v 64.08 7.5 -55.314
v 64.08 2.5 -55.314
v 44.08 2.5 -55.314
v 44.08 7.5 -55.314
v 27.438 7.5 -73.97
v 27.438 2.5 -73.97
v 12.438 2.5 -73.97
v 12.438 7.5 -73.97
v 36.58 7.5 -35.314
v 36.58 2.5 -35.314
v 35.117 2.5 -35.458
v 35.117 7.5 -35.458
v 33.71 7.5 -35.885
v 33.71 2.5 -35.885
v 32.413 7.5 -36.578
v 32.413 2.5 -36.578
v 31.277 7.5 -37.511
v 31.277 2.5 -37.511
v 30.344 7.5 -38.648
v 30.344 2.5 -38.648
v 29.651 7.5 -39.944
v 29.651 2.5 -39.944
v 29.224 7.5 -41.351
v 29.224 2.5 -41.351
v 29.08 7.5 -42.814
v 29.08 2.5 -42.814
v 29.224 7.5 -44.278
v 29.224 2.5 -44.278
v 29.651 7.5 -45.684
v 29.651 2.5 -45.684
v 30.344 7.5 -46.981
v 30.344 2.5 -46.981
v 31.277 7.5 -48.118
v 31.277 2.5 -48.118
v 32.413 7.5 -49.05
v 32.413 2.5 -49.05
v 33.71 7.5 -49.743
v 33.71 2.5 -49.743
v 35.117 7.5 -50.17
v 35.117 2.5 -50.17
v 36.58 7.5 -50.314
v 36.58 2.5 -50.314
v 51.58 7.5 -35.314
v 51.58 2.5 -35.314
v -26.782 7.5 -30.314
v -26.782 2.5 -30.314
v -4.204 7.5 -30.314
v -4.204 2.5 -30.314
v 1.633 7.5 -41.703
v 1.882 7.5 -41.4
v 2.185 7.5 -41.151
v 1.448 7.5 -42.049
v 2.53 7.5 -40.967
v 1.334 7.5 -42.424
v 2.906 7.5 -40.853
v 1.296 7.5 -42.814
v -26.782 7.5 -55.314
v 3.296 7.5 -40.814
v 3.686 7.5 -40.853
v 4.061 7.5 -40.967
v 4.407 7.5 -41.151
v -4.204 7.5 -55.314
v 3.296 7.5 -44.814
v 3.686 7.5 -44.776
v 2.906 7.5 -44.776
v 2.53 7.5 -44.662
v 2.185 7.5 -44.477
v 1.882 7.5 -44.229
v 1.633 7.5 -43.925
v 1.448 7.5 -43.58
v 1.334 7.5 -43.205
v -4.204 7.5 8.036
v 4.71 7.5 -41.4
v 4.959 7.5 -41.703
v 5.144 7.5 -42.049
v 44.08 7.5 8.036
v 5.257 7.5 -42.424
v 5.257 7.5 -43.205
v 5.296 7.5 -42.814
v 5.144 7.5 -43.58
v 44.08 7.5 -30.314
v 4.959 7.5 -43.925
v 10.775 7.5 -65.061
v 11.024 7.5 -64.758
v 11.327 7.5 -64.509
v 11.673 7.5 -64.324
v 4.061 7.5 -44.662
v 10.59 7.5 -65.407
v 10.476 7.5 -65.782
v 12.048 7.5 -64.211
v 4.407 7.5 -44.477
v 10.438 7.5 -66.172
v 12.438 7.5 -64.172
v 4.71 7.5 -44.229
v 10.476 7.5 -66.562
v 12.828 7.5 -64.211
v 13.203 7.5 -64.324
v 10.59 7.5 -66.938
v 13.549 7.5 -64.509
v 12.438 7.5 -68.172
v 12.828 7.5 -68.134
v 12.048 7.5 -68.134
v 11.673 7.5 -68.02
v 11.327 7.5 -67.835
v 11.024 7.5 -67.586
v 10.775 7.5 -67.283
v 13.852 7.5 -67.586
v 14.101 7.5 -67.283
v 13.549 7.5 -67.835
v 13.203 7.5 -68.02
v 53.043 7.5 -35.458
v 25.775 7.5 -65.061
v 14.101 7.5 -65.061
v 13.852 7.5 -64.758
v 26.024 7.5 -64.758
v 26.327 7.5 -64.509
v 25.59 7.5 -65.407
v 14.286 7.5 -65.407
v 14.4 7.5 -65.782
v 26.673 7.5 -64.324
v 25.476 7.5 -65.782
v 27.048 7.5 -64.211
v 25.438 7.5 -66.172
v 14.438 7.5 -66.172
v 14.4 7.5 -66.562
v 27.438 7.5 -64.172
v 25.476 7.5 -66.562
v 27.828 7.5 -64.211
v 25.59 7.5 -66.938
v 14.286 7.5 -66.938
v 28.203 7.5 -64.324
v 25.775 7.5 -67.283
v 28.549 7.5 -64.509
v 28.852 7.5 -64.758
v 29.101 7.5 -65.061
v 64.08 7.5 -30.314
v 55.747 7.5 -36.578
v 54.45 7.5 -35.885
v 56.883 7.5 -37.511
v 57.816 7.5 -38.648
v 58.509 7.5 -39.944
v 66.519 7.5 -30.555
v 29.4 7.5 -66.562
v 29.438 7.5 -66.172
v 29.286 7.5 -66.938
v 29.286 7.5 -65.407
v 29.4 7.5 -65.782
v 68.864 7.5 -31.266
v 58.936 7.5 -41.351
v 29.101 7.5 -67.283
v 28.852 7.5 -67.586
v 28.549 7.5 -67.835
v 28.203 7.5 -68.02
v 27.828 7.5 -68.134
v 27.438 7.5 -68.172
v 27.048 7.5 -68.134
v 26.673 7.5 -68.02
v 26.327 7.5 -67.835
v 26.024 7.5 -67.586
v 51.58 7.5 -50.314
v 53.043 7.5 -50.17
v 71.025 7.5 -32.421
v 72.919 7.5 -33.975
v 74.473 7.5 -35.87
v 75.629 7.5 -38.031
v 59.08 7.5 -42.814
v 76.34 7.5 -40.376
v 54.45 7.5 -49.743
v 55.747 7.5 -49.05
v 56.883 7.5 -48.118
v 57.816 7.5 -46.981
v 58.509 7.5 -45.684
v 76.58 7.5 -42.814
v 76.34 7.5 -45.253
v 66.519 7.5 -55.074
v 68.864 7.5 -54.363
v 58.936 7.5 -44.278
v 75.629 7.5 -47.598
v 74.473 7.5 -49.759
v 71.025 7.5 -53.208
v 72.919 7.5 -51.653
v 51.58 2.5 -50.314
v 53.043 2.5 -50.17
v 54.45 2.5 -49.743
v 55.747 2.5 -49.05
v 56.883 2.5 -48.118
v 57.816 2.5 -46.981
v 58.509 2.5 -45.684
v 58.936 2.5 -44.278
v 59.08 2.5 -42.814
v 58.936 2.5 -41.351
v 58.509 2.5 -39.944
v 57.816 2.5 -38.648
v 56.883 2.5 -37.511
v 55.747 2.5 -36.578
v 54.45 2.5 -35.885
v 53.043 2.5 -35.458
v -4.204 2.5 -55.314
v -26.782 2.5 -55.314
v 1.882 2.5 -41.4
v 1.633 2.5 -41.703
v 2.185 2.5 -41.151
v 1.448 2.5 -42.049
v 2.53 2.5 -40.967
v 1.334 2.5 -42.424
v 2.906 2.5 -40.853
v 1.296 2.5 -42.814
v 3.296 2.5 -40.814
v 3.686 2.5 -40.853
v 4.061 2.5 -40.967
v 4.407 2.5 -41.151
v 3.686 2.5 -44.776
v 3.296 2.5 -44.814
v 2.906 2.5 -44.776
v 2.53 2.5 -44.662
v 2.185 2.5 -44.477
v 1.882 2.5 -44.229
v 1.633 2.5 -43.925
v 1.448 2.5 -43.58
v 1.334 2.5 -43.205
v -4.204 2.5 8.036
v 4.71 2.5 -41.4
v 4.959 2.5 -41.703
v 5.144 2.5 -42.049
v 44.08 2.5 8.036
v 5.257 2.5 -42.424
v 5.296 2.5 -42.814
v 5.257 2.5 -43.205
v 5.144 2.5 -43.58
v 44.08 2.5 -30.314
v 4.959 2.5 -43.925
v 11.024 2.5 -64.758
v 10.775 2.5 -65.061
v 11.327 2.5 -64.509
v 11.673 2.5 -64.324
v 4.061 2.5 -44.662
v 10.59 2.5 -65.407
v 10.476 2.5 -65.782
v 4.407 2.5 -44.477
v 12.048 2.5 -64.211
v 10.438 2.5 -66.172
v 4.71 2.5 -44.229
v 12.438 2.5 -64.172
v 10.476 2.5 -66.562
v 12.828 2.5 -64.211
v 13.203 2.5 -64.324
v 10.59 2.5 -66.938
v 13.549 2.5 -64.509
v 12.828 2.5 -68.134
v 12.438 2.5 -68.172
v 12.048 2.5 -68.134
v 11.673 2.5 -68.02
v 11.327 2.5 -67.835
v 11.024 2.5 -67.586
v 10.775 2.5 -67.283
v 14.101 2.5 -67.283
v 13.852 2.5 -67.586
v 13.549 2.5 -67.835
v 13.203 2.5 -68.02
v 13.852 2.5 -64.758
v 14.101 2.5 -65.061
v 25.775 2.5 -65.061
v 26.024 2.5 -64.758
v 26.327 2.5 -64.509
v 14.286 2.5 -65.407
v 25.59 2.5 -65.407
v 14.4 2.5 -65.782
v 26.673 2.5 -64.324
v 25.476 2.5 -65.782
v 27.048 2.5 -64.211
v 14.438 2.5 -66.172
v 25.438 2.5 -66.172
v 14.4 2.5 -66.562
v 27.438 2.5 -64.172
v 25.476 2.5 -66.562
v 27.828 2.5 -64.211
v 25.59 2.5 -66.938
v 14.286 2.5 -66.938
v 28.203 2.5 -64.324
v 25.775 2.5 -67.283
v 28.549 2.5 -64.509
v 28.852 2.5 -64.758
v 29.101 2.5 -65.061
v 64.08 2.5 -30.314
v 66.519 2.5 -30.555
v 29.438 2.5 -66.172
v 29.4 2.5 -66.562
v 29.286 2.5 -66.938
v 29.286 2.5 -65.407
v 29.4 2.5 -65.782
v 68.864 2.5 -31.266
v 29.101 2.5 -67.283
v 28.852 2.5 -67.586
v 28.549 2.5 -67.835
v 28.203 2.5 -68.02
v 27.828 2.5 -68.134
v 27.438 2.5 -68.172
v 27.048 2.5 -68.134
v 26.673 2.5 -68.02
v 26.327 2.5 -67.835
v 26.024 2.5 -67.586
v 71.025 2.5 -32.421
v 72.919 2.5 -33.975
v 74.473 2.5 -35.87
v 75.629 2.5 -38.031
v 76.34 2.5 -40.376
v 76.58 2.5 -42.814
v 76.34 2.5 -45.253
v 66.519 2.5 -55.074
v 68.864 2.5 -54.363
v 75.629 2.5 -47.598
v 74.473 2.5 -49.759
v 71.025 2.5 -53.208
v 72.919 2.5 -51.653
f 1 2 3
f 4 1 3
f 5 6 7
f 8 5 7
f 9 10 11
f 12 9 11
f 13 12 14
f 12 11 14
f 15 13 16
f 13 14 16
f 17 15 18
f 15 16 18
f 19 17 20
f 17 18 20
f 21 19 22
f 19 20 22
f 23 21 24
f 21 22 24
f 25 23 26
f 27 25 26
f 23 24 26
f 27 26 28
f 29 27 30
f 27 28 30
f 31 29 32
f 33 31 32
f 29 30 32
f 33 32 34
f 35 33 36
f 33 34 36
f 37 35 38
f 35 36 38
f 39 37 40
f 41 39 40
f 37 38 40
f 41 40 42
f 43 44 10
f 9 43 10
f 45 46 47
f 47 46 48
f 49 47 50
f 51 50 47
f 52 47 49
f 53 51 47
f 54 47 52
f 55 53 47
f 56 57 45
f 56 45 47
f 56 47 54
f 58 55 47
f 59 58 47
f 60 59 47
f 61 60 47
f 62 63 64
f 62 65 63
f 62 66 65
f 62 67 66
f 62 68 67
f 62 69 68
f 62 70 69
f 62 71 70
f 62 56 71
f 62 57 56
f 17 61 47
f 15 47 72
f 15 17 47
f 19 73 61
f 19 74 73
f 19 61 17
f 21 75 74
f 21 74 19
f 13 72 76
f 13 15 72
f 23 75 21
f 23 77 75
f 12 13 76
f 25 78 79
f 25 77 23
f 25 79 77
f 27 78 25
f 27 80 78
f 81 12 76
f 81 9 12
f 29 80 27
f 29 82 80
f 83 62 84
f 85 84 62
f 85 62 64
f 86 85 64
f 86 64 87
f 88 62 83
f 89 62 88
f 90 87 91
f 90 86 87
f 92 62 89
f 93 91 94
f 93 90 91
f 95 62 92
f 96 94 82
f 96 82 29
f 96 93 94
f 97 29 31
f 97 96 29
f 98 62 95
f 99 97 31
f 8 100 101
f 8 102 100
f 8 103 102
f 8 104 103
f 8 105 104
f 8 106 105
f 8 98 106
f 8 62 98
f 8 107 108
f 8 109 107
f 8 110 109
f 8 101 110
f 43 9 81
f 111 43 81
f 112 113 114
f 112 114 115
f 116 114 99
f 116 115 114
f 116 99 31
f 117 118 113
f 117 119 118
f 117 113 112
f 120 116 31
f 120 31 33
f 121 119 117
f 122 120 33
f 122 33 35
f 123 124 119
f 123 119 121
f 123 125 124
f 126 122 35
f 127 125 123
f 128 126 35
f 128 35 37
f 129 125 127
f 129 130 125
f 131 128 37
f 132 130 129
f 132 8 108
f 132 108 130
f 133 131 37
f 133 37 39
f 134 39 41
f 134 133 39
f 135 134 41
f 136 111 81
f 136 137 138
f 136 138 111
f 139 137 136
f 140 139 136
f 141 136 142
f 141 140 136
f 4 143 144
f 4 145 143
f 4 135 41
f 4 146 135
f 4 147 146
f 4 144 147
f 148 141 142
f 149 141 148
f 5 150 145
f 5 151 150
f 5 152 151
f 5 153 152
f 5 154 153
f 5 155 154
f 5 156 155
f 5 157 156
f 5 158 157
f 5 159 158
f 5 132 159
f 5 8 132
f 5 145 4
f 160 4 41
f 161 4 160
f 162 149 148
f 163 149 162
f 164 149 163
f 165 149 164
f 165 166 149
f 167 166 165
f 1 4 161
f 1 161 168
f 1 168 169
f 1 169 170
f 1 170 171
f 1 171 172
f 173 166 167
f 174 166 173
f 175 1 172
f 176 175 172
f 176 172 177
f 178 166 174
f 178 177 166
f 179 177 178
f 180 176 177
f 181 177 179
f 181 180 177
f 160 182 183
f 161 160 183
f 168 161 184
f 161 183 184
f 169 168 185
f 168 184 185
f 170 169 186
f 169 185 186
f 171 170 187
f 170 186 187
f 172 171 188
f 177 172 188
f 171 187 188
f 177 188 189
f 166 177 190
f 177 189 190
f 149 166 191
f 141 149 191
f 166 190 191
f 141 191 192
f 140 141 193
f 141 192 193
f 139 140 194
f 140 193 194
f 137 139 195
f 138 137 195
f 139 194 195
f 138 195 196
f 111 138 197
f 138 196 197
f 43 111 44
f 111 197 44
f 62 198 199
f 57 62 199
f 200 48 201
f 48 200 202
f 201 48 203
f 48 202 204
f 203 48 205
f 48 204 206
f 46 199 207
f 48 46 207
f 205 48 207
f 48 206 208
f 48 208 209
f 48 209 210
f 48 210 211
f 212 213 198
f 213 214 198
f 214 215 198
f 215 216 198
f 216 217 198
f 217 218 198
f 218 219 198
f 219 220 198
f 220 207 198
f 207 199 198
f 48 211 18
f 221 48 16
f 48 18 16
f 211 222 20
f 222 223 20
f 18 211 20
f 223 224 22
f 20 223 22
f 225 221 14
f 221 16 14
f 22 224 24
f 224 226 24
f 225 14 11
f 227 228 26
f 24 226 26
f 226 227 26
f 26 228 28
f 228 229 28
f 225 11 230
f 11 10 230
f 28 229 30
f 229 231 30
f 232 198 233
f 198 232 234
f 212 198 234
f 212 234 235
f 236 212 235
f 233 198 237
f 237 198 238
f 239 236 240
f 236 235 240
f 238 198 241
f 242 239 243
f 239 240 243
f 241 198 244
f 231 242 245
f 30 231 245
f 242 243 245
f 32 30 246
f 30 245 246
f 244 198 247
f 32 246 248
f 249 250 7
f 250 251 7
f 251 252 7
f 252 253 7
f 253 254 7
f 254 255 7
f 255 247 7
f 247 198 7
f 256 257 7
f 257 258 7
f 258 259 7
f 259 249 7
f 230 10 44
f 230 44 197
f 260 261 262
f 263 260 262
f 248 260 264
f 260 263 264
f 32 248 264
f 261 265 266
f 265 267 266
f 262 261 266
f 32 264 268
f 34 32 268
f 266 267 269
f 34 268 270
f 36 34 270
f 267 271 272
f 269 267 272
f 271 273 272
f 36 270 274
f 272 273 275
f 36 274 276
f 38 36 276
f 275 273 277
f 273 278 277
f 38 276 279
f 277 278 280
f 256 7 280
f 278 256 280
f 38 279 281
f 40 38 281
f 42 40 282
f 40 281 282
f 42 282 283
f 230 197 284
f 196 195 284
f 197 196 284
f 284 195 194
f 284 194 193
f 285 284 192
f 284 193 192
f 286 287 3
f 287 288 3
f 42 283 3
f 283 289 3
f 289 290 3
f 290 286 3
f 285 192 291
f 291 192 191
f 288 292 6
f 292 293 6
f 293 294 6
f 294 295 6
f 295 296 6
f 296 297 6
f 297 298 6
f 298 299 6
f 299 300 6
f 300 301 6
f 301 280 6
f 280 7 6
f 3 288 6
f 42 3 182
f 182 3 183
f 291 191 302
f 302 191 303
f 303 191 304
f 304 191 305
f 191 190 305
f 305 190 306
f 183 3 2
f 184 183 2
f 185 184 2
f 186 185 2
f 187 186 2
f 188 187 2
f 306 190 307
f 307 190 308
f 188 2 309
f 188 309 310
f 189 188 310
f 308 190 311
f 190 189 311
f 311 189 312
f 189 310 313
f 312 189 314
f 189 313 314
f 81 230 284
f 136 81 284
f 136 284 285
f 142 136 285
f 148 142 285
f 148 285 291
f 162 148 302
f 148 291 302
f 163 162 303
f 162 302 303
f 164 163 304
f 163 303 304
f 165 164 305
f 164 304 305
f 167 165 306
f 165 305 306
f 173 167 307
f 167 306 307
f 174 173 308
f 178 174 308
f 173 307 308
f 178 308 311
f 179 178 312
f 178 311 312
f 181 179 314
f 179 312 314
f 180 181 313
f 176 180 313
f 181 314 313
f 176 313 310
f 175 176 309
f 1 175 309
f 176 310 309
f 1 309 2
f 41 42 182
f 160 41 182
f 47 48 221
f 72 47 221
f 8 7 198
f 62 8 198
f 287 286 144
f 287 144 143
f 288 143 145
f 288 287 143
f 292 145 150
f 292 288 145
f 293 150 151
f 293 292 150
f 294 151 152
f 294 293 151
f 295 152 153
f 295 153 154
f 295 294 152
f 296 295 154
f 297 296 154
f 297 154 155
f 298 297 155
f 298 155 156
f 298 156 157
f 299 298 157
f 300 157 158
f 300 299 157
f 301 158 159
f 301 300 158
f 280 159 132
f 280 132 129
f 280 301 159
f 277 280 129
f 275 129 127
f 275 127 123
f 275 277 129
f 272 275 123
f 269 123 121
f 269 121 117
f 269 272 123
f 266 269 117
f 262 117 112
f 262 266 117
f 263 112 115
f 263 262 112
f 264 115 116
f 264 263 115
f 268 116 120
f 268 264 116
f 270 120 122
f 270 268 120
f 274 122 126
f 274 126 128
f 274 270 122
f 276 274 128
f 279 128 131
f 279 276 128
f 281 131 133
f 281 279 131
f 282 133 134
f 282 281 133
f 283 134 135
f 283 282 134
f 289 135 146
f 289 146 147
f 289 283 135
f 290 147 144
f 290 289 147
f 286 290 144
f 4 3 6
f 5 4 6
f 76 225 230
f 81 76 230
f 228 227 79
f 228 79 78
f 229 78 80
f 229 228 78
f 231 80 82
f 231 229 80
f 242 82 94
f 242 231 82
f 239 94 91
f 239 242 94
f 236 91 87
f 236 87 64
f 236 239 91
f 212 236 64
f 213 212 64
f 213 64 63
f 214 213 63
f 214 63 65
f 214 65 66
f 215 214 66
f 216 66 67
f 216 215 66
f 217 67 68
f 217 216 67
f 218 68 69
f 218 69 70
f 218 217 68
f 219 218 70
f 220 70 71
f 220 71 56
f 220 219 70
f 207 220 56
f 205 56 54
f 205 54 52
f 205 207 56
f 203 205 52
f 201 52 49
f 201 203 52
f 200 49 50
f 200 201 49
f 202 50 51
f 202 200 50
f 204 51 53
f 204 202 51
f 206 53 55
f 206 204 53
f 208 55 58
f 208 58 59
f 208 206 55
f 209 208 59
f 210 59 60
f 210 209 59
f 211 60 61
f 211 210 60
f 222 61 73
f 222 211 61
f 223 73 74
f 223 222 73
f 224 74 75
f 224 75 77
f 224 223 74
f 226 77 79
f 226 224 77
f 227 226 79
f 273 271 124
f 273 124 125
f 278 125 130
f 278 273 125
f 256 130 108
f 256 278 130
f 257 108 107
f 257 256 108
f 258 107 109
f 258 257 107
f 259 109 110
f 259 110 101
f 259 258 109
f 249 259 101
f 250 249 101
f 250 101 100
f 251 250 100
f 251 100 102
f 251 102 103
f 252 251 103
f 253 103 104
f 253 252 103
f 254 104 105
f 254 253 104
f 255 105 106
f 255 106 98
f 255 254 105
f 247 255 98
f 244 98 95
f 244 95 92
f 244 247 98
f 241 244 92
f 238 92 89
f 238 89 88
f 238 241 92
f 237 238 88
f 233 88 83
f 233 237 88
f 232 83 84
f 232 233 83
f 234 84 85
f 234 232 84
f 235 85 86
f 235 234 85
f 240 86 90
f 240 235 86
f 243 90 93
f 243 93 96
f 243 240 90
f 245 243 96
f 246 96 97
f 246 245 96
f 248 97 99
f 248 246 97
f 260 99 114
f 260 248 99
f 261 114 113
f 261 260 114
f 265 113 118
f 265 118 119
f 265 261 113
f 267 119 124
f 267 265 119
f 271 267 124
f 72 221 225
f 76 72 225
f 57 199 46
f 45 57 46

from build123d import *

# Parameters (mm, degrees)
SKETCH1_R           = 4
BOSS_EXTRUDE1_DEPTH = 10
SCALE1_SCALE        = 0.5


with BuildPart() as part:
    # Sketch1 → Boss-Extrude1 (new body)
    with BuildSketch(Plane(origin=(0, 0, 0), x_dir=(1, 0, 0), z_dir=(0, 1, 0))):
        with BuildLine():
            Line((-28.284271247, 28.284271247), (-28.284271247, -48.415659381))
            Line((-28.284271247, -48.415659381), (63.338627893, -48.415659381))
            Line((63.338627893, -48.415659381), (68.284271247, -48.415659381))
            Line((68.284271247, -48.415659381), (68.284271247, 28.284271247))
            Line((68.284271247, 28.284271247), (108.284271247, 28.284271247))
            ThreePointArc((108.284271247, 28.284271247), (133.284271247, 53.284271247), (108.284271247, 78.284271247))
            Line((108.284271247, 78.284271247), (68.284271247, 78.284271247))
            Line((68.284271247, 78.284271247), (35, 115.595895274))
            Line((35, 115.595895274), (5, 115.595895274))
            Line((5, 115.595895274), (-28.284271247, 78.284271247))
            Line((-28.284271247, 78.284271247), (-73.439346791, 78.284271247))
            Line((-73.439346791, 78.284271247), (-73.439346791, 28.284271247))
            Line((-73.439346791, 28.284271247), (-28.284271247, 28.284271247))
        make_face()
        with Locations((5, 100)):
            Circle(SKETCH1_R, mode=Mode.SUBTRACT)
        with Locations((35, 100)):
            Circle(SKETCH1_R, mode=Mode.SUBTRACT)
        with Locations((-13.284271247, 53.284271247)):
            Circle(SKETCH1_R, mode=Mode.SUBTRACT)
        with BuildLine():
            Line((53.284271247, 68.284271247), (83.284271247, 68.284271247))
            ThreePointArc((83.284271247, 68.284271247), (98.284271247, 53.284271247), (83.284271247, 38.284271247))
            Line((83.284271247, 38.284271247), (53.284271247, 38.284271247))
            ThreePointArc((53.284271247, 38.284271247), (38.284271247, 53.284271247), (53.284271247, 68.284271247))
        make_face(mode=Mode.SUBTRACT)
    extrude(amount=BOSS_EXTRUDE1_DEPTH)


with BuildPart() as part_1:
    # Scale1: scaled about (19.875908693, 5, -32.344377814)
    add(part.part.scale(SCALE1_SCALE).moved(Location((9.937954346, 2.5, -16.172188907))))


solid = part_1.part
